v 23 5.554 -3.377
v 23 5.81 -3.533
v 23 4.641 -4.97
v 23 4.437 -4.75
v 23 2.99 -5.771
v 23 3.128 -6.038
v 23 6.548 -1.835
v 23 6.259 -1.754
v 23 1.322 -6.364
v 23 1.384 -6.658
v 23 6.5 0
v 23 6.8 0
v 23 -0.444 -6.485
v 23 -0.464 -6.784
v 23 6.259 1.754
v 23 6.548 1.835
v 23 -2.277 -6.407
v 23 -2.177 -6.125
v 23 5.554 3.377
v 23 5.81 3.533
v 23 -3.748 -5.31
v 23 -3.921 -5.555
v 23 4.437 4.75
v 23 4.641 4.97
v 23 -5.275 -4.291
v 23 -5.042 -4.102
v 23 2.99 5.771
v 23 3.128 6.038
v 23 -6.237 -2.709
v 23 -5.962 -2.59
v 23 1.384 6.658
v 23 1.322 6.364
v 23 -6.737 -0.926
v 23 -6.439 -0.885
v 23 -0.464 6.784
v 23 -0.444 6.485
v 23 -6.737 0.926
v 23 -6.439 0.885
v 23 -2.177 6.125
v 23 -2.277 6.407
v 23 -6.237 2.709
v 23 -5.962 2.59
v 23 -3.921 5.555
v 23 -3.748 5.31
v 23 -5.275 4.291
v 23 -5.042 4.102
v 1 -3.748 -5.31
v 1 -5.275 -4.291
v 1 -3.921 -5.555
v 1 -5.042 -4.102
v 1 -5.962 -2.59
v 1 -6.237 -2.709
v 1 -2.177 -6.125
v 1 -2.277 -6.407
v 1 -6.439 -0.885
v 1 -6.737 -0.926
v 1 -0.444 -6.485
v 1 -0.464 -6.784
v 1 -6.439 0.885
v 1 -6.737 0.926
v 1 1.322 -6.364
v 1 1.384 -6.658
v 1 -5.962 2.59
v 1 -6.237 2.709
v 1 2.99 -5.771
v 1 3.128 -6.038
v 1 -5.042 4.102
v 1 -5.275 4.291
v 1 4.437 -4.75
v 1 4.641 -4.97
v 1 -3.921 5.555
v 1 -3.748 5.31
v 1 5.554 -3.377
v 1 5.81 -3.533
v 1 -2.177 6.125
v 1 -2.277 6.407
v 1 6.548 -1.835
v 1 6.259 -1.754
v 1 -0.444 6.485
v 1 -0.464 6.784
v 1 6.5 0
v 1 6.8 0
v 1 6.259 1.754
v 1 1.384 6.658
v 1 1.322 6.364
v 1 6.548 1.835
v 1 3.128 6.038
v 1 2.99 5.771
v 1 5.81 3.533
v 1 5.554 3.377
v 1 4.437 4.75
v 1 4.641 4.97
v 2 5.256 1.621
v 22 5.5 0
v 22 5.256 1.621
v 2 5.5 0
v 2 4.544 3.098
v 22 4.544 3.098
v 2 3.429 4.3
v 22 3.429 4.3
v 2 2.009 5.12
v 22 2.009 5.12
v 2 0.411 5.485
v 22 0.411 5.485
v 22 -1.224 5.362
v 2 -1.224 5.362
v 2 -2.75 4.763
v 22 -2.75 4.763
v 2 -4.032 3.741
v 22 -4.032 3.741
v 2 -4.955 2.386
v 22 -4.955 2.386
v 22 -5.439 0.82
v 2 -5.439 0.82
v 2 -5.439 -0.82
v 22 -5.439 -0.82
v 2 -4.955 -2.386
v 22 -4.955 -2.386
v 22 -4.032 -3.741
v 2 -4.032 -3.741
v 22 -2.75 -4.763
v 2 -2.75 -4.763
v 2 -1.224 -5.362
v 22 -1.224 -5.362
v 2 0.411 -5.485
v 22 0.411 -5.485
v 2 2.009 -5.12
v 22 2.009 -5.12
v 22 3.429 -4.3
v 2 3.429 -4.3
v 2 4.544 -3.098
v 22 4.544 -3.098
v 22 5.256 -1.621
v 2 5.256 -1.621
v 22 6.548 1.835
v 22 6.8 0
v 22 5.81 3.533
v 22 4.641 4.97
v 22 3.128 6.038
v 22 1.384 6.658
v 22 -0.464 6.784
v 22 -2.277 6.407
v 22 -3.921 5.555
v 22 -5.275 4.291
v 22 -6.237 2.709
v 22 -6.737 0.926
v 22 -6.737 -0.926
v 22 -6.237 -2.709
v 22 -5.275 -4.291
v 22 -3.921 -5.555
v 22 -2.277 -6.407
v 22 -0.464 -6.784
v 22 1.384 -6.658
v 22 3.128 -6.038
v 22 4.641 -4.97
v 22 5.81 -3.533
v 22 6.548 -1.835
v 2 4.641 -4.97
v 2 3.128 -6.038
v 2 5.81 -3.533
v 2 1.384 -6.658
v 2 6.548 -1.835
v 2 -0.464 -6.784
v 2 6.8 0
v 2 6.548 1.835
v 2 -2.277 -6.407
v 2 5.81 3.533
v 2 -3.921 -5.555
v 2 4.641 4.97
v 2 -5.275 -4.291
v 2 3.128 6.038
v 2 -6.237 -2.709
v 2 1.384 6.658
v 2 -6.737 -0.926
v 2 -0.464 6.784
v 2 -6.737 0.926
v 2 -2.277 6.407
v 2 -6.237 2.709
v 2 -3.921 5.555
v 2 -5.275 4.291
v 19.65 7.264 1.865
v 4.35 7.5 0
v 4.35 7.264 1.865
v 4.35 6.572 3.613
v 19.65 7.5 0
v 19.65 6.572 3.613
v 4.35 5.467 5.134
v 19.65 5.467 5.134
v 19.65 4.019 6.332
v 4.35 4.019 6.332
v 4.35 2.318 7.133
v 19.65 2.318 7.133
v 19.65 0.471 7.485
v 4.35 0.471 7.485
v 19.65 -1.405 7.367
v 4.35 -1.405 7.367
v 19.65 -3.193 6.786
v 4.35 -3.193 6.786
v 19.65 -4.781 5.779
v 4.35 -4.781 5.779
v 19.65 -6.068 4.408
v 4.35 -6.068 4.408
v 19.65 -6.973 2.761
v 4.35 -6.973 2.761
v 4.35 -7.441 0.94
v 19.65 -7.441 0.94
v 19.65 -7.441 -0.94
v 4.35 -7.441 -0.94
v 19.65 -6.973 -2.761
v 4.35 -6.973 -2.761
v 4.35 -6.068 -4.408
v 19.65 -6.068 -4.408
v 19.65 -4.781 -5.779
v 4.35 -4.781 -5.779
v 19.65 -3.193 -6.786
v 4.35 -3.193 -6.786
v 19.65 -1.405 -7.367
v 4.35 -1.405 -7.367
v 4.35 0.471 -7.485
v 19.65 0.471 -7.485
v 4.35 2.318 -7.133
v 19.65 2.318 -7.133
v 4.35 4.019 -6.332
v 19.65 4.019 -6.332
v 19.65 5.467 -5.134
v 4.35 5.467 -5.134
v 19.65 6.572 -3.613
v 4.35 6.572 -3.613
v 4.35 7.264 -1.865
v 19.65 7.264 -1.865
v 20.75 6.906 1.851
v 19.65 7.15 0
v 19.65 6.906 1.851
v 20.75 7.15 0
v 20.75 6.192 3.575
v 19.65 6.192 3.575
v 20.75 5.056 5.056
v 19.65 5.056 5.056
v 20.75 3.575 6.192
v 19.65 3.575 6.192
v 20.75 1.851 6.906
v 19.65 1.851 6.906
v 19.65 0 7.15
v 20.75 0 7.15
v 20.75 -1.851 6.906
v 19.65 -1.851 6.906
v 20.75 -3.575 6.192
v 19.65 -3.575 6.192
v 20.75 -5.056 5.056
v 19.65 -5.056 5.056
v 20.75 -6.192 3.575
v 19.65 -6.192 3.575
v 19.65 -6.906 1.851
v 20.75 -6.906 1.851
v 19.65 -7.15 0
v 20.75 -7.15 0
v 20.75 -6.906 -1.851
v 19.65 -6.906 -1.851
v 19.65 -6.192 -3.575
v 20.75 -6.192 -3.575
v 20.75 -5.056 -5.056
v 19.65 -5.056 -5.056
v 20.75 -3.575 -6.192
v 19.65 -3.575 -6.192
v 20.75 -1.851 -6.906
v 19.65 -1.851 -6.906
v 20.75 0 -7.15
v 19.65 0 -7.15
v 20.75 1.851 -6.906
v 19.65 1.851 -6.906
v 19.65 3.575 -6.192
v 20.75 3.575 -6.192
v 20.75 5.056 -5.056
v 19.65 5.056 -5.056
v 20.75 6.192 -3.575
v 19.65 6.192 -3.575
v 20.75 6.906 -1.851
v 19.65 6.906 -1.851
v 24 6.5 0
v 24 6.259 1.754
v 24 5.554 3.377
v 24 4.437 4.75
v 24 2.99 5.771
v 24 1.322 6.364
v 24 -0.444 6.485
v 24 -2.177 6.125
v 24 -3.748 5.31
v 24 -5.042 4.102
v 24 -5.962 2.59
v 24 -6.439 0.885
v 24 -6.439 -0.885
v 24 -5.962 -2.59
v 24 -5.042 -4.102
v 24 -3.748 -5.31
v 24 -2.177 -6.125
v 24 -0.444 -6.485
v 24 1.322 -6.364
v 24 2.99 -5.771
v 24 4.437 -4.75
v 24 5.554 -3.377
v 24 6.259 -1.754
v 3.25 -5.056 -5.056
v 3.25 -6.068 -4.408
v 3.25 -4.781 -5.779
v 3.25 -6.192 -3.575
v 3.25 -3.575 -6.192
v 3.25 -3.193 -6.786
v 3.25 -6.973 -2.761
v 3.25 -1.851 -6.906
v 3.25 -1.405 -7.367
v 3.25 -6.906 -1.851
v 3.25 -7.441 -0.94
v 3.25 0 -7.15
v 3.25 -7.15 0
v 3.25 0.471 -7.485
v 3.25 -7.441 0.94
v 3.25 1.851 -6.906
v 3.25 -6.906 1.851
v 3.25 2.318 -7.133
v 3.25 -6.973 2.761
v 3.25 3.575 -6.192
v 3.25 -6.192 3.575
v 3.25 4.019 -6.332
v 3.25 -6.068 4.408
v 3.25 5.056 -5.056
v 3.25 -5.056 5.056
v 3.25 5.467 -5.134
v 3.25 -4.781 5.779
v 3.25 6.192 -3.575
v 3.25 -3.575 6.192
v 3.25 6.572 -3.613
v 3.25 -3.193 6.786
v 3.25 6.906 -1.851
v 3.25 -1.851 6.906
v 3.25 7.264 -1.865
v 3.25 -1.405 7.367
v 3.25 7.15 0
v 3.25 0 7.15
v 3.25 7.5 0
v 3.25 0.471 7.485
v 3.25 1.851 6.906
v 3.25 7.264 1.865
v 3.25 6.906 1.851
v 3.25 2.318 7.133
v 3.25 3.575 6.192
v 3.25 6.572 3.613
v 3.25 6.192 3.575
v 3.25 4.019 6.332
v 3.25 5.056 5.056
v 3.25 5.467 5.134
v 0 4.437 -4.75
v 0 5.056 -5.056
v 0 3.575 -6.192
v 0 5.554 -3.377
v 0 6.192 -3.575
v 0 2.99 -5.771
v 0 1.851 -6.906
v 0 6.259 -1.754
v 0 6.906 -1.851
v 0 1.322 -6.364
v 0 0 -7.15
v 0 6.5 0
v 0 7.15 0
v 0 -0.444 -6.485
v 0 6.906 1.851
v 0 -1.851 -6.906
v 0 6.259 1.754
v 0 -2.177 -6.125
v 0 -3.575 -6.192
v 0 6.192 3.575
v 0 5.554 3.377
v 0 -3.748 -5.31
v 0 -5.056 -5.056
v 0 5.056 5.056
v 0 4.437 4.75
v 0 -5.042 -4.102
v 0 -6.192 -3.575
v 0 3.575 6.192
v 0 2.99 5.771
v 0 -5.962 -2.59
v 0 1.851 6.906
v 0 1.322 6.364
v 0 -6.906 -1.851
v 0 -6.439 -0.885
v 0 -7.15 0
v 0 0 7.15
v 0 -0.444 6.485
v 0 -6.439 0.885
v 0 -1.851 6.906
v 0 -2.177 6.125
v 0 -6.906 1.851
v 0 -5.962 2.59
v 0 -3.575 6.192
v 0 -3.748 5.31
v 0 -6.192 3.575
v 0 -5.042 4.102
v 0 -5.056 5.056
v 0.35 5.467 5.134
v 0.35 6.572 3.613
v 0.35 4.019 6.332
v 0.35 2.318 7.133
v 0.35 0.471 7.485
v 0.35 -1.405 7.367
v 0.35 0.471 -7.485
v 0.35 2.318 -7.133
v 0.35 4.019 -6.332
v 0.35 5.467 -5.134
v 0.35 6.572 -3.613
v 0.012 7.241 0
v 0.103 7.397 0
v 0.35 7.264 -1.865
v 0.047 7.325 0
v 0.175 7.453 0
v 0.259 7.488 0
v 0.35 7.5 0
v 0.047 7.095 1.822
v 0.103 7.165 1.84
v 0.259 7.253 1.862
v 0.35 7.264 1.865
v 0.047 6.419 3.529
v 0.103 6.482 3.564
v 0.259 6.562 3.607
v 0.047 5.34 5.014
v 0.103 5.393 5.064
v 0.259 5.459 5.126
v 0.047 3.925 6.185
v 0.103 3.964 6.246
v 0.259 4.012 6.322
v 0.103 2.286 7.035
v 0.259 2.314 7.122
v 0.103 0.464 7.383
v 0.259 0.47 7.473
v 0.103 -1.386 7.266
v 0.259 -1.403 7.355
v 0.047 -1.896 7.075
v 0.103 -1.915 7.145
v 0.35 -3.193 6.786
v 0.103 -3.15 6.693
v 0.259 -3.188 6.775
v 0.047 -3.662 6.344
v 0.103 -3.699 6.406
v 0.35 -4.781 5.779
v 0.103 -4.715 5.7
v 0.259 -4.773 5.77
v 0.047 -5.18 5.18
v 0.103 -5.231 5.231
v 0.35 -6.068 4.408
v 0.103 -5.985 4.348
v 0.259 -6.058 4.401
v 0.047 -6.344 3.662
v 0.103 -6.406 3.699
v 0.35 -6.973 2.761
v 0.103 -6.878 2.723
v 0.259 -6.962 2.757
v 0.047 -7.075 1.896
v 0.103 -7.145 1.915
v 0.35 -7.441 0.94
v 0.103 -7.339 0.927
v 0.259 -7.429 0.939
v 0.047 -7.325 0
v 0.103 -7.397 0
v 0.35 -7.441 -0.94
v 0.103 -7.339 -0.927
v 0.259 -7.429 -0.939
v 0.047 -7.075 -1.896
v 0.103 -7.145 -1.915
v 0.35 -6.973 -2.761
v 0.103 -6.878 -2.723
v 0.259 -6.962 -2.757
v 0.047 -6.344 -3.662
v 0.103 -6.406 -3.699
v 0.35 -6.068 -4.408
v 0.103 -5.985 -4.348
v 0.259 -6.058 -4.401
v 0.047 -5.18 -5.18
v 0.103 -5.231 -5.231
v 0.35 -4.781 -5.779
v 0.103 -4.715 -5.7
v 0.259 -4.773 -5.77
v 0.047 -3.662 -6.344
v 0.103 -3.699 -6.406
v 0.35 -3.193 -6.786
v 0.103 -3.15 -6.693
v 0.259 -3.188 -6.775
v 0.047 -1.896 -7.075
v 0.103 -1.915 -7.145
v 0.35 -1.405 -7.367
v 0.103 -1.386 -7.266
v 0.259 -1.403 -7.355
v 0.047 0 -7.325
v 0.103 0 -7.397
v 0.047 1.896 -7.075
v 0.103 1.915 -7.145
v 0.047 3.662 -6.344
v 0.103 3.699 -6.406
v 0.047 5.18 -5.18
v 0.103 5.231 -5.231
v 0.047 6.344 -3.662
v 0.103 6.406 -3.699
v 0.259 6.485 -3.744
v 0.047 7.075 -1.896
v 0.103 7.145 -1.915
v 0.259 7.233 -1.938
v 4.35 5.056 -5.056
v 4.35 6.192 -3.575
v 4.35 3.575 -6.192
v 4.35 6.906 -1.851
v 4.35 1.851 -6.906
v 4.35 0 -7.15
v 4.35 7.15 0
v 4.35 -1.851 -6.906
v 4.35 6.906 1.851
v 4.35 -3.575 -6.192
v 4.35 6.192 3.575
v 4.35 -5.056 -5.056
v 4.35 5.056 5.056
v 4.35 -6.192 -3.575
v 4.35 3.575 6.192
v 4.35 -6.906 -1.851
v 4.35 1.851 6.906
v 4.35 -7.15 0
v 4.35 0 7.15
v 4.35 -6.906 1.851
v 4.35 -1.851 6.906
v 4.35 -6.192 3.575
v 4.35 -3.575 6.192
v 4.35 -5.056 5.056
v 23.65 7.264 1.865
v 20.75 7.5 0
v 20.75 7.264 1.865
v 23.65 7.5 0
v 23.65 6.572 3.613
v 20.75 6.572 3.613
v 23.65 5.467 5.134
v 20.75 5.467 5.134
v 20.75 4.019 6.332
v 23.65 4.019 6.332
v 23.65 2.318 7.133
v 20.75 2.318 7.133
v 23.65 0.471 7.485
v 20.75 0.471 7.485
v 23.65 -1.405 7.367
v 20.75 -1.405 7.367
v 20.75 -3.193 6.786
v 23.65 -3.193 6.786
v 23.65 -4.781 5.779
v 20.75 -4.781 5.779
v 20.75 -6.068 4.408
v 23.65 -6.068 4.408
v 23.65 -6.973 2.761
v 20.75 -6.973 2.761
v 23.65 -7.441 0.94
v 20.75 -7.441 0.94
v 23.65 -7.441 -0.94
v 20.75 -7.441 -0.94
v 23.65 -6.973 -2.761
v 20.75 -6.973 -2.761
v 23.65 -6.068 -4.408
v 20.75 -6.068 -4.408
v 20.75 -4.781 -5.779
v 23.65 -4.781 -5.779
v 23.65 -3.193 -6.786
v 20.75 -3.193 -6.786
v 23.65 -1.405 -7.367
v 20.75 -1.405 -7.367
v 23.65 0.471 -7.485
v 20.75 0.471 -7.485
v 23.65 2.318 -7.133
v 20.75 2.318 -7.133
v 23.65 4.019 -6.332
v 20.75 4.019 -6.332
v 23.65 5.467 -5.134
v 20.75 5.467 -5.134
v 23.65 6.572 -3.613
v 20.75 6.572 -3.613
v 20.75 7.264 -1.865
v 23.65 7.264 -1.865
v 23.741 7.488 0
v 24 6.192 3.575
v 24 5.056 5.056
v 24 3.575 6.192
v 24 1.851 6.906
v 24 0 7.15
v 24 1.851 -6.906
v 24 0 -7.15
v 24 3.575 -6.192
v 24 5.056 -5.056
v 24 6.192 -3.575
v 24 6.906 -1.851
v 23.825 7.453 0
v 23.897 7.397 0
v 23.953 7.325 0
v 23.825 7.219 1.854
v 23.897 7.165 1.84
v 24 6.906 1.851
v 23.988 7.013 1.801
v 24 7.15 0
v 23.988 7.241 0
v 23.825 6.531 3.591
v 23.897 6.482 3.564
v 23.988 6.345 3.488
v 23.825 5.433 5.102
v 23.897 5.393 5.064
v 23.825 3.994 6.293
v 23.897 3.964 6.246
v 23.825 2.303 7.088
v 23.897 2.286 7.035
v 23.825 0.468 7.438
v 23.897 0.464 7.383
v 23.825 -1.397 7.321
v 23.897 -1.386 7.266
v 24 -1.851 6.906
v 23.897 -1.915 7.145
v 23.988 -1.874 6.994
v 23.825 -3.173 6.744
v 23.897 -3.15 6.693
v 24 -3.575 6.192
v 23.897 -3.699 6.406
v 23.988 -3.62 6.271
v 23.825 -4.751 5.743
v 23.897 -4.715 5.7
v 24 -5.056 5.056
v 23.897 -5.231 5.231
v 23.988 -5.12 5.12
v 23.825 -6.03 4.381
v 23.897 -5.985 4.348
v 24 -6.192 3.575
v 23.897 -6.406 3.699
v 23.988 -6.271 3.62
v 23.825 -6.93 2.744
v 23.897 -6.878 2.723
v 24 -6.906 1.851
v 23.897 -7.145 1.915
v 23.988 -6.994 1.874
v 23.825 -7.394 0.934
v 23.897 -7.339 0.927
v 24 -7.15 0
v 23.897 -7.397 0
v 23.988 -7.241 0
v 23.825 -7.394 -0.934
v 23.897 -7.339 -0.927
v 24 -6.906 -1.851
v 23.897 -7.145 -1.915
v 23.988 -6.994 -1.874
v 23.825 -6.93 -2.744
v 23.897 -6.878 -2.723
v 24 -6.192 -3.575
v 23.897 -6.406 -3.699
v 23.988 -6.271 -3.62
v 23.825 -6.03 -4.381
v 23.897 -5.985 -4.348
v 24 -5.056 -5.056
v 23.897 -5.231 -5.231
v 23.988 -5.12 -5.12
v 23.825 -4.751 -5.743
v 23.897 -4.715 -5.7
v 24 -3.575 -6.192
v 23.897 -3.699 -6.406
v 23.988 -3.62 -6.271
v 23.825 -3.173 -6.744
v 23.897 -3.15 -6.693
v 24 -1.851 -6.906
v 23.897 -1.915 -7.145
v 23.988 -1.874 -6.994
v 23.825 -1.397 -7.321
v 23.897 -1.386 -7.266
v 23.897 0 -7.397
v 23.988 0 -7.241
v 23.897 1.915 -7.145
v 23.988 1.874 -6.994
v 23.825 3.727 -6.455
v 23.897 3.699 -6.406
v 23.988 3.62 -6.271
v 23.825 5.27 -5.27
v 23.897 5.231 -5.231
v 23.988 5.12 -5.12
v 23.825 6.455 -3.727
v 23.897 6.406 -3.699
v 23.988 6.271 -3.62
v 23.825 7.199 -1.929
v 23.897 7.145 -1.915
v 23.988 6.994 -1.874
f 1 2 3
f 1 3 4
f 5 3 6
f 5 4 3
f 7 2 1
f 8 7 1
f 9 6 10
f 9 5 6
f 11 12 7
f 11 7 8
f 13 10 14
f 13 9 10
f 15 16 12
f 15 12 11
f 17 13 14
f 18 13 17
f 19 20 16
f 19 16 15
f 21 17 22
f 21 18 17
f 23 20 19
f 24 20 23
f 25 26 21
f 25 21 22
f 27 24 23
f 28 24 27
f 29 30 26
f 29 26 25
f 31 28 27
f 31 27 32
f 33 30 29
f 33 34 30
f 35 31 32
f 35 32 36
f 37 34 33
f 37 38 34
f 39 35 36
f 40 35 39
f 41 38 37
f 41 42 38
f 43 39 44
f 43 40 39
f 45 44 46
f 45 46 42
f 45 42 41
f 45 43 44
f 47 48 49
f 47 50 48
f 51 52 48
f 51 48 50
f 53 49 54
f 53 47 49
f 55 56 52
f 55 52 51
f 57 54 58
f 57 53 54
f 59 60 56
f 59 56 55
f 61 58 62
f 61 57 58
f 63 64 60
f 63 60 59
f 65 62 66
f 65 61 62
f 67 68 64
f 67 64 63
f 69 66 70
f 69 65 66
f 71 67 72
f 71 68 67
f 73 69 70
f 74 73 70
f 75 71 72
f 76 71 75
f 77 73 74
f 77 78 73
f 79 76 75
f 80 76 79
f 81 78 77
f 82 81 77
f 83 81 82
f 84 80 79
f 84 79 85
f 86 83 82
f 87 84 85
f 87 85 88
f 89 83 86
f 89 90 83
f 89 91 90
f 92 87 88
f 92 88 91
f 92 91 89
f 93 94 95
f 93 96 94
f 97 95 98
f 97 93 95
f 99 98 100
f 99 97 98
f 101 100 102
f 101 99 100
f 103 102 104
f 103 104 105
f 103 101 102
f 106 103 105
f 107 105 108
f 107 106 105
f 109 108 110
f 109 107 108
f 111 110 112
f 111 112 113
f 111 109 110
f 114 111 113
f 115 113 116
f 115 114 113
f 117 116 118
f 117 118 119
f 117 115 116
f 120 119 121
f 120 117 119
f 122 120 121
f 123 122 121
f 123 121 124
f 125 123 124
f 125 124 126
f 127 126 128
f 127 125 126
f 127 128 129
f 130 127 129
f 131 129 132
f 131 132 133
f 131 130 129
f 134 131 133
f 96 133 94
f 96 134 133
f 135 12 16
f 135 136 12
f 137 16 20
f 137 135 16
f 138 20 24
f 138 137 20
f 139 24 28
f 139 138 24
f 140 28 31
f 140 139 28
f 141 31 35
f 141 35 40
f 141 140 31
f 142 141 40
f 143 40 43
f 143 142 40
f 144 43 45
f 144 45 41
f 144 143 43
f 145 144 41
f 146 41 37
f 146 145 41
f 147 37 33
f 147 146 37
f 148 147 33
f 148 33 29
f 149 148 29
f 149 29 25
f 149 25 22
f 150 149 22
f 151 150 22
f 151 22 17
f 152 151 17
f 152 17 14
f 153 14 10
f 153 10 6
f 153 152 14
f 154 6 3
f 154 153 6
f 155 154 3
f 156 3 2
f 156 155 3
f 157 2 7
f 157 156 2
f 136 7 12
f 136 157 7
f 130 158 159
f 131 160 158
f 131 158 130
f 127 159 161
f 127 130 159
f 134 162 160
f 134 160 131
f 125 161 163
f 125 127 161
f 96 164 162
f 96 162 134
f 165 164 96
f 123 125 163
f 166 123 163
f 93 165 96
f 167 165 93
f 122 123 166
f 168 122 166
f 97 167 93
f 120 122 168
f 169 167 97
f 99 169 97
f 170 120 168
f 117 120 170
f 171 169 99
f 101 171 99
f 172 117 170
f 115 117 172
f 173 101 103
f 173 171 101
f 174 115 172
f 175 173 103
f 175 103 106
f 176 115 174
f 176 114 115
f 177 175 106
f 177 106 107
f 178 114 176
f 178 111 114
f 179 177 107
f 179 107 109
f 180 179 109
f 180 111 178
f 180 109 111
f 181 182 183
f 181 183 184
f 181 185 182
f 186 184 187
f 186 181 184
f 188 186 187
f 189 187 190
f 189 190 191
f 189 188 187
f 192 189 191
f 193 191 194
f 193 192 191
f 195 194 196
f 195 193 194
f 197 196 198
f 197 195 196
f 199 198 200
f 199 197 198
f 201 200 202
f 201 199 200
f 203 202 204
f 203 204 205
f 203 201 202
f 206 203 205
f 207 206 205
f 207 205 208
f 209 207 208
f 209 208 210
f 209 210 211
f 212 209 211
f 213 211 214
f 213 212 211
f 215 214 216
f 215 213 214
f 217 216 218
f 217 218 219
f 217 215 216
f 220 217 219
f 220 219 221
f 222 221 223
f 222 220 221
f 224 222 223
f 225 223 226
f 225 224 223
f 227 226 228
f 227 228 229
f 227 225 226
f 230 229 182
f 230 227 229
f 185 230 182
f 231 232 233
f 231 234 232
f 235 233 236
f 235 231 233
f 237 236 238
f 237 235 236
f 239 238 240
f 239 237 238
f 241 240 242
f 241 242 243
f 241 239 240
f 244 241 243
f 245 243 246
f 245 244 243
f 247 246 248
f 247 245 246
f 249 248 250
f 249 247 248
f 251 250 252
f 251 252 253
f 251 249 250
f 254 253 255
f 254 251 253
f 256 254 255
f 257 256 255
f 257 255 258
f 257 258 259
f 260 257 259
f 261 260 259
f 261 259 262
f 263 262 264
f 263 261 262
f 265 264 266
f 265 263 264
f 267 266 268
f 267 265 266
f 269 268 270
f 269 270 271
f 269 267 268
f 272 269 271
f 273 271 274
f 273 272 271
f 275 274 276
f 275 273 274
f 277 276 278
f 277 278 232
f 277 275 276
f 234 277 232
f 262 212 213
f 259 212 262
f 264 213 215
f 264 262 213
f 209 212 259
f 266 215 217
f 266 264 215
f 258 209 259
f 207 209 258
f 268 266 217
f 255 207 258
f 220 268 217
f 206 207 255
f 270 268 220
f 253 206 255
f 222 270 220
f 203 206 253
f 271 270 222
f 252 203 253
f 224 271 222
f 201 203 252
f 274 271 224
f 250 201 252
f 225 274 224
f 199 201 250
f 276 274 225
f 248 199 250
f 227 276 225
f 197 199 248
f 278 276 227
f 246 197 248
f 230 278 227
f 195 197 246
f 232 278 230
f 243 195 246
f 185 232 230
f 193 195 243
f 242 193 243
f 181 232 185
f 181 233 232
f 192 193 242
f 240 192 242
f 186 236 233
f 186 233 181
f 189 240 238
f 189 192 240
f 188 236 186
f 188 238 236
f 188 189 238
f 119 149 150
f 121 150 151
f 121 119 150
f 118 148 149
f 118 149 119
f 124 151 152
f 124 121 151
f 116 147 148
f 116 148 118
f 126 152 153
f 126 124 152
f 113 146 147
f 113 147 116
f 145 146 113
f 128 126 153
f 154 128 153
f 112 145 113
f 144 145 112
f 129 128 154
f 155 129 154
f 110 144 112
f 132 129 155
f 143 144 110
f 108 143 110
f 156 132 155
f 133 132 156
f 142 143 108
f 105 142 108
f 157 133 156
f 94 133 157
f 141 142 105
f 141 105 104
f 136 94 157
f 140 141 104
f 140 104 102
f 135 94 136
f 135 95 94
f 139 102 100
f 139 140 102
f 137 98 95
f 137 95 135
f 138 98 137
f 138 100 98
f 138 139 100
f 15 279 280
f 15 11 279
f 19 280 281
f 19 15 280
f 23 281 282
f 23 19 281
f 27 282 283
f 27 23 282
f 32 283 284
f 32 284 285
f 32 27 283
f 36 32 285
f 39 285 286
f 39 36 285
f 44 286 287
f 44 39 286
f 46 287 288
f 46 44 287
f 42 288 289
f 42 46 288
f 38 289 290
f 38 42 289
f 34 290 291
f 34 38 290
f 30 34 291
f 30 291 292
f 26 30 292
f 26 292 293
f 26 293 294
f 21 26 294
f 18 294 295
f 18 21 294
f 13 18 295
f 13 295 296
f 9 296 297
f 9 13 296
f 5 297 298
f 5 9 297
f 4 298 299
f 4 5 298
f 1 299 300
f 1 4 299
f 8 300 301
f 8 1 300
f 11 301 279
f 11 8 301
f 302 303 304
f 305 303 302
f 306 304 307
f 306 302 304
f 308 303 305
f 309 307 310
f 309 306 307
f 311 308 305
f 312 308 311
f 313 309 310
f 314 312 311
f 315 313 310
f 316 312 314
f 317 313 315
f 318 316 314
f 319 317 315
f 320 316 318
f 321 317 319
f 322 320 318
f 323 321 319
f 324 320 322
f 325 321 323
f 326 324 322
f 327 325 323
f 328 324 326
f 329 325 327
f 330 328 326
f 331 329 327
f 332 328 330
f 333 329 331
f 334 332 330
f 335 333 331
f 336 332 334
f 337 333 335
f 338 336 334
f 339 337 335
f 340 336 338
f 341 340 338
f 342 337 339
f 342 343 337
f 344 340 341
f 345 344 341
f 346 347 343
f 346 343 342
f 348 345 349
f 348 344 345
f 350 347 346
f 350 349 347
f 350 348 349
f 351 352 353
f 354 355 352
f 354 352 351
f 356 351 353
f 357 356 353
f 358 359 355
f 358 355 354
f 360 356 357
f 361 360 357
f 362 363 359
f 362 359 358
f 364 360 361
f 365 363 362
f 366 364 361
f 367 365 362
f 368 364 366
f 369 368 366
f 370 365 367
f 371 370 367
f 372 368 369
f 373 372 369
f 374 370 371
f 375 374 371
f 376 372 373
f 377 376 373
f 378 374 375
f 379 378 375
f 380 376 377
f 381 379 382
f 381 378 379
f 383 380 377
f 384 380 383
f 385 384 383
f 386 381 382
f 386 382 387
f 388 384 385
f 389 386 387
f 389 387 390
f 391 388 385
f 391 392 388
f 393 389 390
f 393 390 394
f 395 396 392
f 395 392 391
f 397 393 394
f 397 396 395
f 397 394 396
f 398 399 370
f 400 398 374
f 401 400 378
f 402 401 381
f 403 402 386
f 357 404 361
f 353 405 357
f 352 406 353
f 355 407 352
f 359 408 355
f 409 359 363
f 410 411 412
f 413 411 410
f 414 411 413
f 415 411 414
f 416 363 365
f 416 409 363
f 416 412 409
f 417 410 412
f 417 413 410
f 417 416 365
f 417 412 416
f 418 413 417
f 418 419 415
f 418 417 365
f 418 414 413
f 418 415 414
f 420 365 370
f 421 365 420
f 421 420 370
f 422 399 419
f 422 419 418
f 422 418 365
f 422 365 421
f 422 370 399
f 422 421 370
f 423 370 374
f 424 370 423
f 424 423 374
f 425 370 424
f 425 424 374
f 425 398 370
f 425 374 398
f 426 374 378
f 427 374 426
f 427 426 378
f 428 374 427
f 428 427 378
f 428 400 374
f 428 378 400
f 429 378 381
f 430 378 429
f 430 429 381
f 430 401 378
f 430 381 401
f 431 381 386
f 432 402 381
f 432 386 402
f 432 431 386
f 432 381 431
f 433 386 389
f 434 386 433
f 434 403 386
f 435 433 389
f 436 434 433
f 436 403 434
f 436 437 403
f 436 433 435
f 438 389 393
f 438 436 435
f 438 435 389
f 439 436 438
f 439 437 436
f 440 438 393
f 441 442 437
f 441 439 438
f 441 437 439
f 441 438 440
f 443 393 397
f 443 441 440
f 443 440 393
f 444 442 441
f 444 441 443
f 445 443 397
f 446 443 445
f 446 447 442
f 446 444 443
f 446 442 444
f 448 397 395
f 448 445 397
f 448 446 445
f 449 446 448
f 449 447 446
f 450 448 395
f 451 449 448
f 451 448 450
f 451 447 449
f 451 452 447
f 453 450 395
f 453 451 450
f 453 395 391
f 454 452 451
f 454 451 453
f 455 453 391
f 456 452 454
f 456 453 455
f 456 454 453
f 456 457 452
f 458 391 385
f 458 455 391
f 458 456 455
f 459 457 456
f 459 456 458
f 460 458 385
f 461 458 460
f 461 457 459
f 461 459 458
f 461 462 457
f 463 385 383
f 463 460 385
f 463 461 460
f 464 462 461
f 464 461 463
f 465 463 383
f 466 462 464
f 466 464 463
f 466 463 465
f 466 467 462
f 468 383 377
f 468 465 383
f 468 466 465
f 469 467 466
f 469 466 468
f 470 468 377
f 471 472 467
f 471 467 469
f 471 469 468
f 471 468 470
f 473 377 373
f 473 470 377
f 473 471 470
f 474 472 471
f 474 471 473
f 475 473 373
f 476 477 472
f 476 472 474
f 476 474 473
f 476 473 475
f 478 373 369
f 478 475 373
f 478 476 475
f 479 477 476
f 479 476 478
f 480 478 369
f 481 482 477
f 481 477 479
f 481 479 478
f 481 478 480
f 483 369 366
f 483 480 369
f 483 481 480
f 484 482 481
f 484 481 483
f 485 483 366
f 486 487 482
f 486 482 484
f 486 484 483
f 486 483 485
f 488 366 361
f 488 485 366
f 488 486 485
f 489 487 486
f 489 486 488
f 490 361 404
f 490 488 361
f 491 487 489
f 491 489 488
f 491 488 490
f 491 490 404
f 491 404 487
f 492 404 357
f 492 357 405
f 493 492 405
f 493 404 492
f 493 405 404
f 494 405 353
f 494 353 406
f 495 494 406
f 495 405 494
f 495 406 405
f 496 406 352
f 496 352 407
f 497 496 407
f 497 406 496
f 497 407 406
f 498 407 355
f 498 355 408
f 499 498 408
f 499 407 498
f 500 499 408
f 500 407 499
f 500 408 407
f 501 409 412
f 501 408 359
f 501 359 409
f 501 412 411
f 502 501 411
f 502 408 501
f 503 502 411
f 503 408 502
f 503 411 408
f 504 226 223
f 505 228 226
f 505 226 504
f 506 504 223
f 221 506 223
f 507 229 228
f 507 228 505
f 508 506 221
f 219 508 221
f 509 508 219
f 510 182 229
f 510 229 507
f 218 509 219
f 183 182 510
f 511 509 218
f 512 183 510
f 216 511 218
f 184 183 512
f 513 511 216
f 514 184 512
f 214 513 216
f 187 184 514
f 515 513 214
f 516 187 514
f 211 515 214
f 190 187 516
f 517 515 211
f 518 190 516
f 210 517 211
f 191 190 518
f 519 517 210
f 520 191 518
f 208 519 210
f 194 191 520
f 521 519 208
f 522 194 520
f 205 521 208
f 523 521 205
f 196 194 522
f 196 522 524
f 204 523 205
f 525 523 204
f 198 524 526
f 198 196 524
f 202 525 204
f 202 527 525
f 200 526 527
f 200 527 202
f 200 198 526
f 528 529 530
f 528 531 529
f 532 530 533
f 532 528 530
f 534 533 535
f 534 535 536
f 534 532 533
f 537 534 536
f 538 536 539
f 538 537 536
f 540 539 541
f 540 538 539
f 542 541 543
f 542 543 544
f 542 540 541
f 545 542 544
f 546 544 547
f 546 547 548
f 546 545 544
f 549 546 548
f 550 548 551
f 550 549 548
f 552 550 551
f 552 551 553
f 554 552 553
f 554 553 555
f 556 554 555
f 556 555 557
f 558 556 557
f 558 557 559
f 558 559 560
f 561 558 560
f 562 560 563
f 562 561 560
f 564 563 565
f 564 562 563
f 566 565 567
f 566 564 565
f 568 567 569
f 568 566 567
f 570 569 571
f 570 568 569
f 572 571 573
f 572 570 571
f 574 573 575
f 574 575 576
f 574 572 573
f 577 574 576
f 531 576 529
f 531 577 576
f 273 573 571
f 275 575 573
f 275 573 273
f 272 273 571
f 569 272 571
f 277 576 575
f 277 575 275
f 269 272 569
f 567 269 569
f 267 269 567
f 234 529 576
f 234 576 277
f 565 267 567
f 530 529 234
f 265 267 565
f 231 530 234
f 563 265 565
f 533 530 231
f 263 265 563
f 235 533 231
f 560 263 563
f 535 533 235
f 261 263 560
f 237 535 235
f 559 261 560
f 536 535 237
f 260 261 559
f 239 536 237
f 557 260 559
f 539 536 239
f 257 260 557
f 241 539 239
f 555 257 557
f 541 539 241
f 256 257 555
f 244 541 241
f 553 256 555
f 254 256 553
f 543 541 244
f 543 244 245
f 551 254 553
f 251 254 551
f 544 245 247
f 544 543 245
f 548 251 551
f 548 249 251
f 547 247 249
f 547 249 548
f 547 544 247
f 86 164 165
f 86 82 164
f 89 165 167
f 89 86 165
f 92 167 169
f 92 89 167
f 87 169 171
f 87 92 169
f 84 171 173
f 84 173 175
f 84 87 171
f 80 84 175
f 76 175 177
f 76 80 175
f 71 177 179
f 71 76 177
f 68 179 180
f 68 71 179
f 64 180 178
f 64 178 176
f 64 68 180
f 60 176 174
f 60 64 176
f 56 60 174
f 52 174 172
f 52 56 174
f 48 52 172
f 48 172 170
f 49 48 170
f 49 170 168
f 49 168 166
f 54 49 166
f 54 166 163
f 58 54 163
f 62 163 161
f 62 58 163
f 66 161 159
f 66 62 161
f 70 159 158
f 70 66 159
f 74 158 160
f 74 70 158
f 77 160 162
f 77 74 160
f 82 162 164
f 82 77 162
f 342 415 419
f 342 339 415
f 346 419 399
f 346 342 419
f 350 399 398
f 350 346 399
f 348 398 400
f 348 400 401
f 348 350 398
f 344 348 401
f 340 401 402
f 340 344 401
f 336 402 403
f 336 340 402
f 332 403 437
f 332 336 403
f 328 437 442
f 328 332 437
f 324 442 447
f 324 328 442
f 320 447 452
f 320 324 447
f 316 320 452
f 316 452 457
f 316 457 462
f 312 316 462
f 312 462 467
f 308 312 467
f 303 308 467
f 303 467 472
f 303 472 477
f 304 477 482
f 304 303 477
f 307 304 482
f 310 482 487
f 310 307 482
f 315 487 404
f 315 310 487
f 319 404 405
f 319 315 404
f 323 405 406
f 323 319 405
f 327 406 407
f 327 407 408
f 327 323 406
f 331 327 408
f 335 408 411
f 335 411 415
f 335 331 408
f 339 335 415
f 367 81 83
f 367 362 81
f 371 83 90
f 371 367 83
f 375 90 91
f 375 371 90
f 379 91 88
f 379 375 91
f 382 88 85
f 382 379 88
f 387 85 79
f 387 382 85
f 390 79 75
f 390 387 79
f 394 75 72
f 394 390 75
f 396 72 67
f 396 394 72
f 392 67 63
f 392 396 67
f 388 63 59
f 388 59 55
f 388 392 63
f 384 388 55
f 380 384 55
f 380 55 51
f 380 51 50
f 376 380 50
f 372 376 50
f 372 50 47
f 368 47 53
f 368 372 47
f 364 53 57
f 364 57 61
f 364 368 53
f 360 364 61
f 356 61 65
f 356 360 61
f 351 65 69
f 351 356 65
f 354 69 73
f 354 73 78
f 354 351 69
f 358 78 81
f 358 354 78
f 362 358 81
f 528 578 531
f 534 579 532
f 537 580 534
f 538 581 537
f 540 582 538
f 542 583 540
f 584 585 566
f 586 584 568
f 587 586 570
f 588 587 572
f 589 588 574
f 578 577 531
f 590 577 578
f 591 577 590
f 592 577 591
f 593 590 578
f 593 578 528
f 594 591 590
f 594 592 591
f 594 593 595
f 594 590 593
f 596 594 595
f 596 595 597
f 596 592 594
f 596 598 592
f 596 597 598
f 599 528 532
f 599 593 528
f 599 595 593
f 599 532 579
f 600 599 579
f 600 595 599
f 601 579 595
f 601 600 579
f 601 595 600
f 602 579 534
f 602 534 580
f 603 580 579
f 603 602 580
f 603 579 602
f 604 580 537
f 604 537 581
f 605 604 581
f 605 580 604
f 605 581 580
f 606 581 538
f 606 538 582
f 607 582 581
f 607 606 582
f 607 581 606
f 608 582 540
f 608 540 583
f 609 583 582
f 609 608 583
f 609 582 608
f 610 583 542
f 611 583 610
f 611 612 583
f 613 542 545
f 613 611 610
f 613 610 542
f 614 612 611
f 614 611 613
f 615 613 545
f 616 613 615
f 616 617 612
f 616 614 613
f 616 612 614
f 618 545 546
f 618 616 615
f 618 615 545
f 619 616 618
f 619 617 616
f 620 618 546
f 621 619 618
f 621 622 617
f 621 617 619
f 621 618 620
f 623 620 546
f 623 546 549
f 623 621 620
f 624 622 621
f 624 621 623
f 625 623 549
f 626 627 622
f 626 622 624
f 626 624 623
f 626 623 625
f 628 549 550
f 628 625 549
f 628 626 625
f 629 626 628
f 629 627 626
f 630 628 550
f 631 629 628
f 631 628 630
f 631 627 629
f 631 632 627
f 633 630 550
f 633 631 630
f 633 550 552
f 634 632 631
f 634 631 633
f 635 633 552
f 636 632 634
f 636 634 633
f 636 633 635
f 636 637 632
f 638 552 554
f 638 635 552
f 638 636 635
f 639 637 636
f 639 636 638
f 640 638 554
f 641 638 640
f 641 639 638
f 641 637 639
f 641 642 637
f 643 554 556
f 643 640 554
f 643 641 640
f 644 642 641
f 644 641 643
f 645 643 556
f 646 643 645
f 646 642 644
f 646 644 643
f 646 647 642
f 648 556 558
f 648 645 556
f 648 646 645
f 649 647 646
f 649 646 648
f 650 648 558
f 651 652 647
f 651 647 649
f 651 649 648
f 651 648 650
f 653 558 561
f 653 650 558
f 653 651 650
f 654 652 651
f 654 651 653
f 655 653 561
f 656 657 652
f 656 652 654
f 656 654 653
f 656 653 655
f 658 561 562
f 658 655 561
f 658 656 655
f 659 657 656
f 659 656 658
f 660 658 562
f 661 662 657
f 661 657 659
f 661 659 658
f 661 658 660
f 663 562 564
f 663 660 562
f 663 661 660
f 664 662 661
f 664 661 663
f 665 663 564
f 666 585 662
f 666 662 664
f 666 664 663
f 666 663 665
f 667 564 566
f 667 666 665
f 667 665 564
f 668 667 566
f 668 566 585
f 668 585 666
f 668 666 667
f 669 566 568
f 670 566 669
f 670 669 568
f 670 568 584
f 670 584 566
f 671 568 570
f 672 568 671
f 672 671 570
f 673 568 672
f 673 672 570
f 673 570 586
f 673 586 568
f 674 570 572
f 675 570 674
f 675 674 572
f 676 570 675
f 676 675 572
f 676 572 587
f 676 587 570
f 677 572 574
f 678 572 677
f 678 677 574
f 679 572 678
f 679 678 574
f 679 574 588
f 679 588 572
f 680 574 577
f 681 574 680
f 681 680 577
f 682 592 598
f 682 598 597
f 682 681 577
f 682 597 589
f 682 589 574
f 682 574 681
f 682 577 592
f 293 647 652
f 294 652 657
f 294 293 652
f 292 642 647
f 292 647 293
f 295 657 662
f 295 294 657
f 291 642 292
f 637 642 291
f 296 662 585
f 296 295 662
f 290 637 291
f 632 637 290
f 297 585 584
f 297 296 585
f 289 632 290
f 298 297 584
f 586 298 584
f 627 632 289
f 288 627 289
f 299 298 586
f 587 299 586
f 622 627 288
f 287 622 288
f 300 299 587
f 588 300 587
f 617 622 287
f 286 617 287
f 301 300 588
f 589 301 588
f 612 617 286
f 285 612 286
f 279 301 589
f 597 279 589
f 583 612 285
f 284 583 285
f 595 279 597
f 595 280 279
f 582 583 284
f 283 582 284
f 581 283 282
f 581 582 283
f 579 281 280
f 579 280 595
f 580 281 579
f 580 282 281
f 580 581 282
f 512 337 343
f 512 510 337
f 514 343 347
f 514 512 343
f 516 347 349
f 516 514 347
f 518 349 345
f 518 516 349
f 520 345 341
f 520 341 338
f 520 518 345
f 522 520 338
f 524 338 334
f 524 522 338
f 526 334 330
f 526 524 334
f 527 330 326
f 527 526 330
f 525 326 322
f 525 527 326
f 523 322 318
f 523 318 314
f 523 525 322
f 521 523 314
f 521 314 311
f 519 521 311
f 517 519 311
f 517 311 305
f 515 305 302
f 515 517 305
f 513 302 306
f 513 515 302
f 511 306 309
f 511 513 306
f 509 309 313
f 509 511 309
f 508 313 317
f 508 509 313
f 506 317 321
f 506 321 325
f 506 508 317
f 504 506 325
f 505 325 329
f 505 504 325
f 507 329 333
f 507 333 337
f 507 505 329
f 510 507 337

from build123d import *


with BuildPart() as part:
    # Sketch2 → Revolve1 (revolve)
    with BuildSketch(Plane.XY):
        with BuildLine():
            Line((24, 7.15), (24, 6.5))
            Line((24, 6.5), (23, 6.5))
            Line((23, 6.5), (23, 6.8))
            Line((23, 6.8), (22, 6.8))
            Line((22, 6.8), (22, 5.5))
            Line((22, 5.5), (2, 5.5))
            Line((2, 5.5), (2, 6.8))
            Line((2, 6.8), (1, 6.8))
            Line((1, 6.8), (1, 6.5))
            Line((1, 6.5), (0, 6.5))
            Line((0, 6.5), (0, 7.15))
            ThreePointArc((0, 7.15), (0.102512627, 7.397487373), (0.35, 7.5))
            Line((0.35, 7.5), (3.25, 7.5))
            Line((3.25, 7.5), (3.25, 7.15))
            Line((3.25, 7.15), (4.35, 7.15))
            Line((4.35, 7.15), (4.35, 7.5))
            Line((4.35, 7.5), (19.65, 7.5))
            Line((19.65, 7.5), (19.65, 7.15))
            Line((19.65, 7.15), (20.75, 7.15))
            Line((20.75, 7.15), (20.75, 7.5))
            Line((20.75, 7.5), (23.65, 7.5))
            ThreePointArc((23.65, 7.5), (23.897487373, 7.397487373), (24, 7.15))
        make_face()
    revolve(axis=Axis((0, 0, 0), (1, 0, 0)))


solid = part.part
